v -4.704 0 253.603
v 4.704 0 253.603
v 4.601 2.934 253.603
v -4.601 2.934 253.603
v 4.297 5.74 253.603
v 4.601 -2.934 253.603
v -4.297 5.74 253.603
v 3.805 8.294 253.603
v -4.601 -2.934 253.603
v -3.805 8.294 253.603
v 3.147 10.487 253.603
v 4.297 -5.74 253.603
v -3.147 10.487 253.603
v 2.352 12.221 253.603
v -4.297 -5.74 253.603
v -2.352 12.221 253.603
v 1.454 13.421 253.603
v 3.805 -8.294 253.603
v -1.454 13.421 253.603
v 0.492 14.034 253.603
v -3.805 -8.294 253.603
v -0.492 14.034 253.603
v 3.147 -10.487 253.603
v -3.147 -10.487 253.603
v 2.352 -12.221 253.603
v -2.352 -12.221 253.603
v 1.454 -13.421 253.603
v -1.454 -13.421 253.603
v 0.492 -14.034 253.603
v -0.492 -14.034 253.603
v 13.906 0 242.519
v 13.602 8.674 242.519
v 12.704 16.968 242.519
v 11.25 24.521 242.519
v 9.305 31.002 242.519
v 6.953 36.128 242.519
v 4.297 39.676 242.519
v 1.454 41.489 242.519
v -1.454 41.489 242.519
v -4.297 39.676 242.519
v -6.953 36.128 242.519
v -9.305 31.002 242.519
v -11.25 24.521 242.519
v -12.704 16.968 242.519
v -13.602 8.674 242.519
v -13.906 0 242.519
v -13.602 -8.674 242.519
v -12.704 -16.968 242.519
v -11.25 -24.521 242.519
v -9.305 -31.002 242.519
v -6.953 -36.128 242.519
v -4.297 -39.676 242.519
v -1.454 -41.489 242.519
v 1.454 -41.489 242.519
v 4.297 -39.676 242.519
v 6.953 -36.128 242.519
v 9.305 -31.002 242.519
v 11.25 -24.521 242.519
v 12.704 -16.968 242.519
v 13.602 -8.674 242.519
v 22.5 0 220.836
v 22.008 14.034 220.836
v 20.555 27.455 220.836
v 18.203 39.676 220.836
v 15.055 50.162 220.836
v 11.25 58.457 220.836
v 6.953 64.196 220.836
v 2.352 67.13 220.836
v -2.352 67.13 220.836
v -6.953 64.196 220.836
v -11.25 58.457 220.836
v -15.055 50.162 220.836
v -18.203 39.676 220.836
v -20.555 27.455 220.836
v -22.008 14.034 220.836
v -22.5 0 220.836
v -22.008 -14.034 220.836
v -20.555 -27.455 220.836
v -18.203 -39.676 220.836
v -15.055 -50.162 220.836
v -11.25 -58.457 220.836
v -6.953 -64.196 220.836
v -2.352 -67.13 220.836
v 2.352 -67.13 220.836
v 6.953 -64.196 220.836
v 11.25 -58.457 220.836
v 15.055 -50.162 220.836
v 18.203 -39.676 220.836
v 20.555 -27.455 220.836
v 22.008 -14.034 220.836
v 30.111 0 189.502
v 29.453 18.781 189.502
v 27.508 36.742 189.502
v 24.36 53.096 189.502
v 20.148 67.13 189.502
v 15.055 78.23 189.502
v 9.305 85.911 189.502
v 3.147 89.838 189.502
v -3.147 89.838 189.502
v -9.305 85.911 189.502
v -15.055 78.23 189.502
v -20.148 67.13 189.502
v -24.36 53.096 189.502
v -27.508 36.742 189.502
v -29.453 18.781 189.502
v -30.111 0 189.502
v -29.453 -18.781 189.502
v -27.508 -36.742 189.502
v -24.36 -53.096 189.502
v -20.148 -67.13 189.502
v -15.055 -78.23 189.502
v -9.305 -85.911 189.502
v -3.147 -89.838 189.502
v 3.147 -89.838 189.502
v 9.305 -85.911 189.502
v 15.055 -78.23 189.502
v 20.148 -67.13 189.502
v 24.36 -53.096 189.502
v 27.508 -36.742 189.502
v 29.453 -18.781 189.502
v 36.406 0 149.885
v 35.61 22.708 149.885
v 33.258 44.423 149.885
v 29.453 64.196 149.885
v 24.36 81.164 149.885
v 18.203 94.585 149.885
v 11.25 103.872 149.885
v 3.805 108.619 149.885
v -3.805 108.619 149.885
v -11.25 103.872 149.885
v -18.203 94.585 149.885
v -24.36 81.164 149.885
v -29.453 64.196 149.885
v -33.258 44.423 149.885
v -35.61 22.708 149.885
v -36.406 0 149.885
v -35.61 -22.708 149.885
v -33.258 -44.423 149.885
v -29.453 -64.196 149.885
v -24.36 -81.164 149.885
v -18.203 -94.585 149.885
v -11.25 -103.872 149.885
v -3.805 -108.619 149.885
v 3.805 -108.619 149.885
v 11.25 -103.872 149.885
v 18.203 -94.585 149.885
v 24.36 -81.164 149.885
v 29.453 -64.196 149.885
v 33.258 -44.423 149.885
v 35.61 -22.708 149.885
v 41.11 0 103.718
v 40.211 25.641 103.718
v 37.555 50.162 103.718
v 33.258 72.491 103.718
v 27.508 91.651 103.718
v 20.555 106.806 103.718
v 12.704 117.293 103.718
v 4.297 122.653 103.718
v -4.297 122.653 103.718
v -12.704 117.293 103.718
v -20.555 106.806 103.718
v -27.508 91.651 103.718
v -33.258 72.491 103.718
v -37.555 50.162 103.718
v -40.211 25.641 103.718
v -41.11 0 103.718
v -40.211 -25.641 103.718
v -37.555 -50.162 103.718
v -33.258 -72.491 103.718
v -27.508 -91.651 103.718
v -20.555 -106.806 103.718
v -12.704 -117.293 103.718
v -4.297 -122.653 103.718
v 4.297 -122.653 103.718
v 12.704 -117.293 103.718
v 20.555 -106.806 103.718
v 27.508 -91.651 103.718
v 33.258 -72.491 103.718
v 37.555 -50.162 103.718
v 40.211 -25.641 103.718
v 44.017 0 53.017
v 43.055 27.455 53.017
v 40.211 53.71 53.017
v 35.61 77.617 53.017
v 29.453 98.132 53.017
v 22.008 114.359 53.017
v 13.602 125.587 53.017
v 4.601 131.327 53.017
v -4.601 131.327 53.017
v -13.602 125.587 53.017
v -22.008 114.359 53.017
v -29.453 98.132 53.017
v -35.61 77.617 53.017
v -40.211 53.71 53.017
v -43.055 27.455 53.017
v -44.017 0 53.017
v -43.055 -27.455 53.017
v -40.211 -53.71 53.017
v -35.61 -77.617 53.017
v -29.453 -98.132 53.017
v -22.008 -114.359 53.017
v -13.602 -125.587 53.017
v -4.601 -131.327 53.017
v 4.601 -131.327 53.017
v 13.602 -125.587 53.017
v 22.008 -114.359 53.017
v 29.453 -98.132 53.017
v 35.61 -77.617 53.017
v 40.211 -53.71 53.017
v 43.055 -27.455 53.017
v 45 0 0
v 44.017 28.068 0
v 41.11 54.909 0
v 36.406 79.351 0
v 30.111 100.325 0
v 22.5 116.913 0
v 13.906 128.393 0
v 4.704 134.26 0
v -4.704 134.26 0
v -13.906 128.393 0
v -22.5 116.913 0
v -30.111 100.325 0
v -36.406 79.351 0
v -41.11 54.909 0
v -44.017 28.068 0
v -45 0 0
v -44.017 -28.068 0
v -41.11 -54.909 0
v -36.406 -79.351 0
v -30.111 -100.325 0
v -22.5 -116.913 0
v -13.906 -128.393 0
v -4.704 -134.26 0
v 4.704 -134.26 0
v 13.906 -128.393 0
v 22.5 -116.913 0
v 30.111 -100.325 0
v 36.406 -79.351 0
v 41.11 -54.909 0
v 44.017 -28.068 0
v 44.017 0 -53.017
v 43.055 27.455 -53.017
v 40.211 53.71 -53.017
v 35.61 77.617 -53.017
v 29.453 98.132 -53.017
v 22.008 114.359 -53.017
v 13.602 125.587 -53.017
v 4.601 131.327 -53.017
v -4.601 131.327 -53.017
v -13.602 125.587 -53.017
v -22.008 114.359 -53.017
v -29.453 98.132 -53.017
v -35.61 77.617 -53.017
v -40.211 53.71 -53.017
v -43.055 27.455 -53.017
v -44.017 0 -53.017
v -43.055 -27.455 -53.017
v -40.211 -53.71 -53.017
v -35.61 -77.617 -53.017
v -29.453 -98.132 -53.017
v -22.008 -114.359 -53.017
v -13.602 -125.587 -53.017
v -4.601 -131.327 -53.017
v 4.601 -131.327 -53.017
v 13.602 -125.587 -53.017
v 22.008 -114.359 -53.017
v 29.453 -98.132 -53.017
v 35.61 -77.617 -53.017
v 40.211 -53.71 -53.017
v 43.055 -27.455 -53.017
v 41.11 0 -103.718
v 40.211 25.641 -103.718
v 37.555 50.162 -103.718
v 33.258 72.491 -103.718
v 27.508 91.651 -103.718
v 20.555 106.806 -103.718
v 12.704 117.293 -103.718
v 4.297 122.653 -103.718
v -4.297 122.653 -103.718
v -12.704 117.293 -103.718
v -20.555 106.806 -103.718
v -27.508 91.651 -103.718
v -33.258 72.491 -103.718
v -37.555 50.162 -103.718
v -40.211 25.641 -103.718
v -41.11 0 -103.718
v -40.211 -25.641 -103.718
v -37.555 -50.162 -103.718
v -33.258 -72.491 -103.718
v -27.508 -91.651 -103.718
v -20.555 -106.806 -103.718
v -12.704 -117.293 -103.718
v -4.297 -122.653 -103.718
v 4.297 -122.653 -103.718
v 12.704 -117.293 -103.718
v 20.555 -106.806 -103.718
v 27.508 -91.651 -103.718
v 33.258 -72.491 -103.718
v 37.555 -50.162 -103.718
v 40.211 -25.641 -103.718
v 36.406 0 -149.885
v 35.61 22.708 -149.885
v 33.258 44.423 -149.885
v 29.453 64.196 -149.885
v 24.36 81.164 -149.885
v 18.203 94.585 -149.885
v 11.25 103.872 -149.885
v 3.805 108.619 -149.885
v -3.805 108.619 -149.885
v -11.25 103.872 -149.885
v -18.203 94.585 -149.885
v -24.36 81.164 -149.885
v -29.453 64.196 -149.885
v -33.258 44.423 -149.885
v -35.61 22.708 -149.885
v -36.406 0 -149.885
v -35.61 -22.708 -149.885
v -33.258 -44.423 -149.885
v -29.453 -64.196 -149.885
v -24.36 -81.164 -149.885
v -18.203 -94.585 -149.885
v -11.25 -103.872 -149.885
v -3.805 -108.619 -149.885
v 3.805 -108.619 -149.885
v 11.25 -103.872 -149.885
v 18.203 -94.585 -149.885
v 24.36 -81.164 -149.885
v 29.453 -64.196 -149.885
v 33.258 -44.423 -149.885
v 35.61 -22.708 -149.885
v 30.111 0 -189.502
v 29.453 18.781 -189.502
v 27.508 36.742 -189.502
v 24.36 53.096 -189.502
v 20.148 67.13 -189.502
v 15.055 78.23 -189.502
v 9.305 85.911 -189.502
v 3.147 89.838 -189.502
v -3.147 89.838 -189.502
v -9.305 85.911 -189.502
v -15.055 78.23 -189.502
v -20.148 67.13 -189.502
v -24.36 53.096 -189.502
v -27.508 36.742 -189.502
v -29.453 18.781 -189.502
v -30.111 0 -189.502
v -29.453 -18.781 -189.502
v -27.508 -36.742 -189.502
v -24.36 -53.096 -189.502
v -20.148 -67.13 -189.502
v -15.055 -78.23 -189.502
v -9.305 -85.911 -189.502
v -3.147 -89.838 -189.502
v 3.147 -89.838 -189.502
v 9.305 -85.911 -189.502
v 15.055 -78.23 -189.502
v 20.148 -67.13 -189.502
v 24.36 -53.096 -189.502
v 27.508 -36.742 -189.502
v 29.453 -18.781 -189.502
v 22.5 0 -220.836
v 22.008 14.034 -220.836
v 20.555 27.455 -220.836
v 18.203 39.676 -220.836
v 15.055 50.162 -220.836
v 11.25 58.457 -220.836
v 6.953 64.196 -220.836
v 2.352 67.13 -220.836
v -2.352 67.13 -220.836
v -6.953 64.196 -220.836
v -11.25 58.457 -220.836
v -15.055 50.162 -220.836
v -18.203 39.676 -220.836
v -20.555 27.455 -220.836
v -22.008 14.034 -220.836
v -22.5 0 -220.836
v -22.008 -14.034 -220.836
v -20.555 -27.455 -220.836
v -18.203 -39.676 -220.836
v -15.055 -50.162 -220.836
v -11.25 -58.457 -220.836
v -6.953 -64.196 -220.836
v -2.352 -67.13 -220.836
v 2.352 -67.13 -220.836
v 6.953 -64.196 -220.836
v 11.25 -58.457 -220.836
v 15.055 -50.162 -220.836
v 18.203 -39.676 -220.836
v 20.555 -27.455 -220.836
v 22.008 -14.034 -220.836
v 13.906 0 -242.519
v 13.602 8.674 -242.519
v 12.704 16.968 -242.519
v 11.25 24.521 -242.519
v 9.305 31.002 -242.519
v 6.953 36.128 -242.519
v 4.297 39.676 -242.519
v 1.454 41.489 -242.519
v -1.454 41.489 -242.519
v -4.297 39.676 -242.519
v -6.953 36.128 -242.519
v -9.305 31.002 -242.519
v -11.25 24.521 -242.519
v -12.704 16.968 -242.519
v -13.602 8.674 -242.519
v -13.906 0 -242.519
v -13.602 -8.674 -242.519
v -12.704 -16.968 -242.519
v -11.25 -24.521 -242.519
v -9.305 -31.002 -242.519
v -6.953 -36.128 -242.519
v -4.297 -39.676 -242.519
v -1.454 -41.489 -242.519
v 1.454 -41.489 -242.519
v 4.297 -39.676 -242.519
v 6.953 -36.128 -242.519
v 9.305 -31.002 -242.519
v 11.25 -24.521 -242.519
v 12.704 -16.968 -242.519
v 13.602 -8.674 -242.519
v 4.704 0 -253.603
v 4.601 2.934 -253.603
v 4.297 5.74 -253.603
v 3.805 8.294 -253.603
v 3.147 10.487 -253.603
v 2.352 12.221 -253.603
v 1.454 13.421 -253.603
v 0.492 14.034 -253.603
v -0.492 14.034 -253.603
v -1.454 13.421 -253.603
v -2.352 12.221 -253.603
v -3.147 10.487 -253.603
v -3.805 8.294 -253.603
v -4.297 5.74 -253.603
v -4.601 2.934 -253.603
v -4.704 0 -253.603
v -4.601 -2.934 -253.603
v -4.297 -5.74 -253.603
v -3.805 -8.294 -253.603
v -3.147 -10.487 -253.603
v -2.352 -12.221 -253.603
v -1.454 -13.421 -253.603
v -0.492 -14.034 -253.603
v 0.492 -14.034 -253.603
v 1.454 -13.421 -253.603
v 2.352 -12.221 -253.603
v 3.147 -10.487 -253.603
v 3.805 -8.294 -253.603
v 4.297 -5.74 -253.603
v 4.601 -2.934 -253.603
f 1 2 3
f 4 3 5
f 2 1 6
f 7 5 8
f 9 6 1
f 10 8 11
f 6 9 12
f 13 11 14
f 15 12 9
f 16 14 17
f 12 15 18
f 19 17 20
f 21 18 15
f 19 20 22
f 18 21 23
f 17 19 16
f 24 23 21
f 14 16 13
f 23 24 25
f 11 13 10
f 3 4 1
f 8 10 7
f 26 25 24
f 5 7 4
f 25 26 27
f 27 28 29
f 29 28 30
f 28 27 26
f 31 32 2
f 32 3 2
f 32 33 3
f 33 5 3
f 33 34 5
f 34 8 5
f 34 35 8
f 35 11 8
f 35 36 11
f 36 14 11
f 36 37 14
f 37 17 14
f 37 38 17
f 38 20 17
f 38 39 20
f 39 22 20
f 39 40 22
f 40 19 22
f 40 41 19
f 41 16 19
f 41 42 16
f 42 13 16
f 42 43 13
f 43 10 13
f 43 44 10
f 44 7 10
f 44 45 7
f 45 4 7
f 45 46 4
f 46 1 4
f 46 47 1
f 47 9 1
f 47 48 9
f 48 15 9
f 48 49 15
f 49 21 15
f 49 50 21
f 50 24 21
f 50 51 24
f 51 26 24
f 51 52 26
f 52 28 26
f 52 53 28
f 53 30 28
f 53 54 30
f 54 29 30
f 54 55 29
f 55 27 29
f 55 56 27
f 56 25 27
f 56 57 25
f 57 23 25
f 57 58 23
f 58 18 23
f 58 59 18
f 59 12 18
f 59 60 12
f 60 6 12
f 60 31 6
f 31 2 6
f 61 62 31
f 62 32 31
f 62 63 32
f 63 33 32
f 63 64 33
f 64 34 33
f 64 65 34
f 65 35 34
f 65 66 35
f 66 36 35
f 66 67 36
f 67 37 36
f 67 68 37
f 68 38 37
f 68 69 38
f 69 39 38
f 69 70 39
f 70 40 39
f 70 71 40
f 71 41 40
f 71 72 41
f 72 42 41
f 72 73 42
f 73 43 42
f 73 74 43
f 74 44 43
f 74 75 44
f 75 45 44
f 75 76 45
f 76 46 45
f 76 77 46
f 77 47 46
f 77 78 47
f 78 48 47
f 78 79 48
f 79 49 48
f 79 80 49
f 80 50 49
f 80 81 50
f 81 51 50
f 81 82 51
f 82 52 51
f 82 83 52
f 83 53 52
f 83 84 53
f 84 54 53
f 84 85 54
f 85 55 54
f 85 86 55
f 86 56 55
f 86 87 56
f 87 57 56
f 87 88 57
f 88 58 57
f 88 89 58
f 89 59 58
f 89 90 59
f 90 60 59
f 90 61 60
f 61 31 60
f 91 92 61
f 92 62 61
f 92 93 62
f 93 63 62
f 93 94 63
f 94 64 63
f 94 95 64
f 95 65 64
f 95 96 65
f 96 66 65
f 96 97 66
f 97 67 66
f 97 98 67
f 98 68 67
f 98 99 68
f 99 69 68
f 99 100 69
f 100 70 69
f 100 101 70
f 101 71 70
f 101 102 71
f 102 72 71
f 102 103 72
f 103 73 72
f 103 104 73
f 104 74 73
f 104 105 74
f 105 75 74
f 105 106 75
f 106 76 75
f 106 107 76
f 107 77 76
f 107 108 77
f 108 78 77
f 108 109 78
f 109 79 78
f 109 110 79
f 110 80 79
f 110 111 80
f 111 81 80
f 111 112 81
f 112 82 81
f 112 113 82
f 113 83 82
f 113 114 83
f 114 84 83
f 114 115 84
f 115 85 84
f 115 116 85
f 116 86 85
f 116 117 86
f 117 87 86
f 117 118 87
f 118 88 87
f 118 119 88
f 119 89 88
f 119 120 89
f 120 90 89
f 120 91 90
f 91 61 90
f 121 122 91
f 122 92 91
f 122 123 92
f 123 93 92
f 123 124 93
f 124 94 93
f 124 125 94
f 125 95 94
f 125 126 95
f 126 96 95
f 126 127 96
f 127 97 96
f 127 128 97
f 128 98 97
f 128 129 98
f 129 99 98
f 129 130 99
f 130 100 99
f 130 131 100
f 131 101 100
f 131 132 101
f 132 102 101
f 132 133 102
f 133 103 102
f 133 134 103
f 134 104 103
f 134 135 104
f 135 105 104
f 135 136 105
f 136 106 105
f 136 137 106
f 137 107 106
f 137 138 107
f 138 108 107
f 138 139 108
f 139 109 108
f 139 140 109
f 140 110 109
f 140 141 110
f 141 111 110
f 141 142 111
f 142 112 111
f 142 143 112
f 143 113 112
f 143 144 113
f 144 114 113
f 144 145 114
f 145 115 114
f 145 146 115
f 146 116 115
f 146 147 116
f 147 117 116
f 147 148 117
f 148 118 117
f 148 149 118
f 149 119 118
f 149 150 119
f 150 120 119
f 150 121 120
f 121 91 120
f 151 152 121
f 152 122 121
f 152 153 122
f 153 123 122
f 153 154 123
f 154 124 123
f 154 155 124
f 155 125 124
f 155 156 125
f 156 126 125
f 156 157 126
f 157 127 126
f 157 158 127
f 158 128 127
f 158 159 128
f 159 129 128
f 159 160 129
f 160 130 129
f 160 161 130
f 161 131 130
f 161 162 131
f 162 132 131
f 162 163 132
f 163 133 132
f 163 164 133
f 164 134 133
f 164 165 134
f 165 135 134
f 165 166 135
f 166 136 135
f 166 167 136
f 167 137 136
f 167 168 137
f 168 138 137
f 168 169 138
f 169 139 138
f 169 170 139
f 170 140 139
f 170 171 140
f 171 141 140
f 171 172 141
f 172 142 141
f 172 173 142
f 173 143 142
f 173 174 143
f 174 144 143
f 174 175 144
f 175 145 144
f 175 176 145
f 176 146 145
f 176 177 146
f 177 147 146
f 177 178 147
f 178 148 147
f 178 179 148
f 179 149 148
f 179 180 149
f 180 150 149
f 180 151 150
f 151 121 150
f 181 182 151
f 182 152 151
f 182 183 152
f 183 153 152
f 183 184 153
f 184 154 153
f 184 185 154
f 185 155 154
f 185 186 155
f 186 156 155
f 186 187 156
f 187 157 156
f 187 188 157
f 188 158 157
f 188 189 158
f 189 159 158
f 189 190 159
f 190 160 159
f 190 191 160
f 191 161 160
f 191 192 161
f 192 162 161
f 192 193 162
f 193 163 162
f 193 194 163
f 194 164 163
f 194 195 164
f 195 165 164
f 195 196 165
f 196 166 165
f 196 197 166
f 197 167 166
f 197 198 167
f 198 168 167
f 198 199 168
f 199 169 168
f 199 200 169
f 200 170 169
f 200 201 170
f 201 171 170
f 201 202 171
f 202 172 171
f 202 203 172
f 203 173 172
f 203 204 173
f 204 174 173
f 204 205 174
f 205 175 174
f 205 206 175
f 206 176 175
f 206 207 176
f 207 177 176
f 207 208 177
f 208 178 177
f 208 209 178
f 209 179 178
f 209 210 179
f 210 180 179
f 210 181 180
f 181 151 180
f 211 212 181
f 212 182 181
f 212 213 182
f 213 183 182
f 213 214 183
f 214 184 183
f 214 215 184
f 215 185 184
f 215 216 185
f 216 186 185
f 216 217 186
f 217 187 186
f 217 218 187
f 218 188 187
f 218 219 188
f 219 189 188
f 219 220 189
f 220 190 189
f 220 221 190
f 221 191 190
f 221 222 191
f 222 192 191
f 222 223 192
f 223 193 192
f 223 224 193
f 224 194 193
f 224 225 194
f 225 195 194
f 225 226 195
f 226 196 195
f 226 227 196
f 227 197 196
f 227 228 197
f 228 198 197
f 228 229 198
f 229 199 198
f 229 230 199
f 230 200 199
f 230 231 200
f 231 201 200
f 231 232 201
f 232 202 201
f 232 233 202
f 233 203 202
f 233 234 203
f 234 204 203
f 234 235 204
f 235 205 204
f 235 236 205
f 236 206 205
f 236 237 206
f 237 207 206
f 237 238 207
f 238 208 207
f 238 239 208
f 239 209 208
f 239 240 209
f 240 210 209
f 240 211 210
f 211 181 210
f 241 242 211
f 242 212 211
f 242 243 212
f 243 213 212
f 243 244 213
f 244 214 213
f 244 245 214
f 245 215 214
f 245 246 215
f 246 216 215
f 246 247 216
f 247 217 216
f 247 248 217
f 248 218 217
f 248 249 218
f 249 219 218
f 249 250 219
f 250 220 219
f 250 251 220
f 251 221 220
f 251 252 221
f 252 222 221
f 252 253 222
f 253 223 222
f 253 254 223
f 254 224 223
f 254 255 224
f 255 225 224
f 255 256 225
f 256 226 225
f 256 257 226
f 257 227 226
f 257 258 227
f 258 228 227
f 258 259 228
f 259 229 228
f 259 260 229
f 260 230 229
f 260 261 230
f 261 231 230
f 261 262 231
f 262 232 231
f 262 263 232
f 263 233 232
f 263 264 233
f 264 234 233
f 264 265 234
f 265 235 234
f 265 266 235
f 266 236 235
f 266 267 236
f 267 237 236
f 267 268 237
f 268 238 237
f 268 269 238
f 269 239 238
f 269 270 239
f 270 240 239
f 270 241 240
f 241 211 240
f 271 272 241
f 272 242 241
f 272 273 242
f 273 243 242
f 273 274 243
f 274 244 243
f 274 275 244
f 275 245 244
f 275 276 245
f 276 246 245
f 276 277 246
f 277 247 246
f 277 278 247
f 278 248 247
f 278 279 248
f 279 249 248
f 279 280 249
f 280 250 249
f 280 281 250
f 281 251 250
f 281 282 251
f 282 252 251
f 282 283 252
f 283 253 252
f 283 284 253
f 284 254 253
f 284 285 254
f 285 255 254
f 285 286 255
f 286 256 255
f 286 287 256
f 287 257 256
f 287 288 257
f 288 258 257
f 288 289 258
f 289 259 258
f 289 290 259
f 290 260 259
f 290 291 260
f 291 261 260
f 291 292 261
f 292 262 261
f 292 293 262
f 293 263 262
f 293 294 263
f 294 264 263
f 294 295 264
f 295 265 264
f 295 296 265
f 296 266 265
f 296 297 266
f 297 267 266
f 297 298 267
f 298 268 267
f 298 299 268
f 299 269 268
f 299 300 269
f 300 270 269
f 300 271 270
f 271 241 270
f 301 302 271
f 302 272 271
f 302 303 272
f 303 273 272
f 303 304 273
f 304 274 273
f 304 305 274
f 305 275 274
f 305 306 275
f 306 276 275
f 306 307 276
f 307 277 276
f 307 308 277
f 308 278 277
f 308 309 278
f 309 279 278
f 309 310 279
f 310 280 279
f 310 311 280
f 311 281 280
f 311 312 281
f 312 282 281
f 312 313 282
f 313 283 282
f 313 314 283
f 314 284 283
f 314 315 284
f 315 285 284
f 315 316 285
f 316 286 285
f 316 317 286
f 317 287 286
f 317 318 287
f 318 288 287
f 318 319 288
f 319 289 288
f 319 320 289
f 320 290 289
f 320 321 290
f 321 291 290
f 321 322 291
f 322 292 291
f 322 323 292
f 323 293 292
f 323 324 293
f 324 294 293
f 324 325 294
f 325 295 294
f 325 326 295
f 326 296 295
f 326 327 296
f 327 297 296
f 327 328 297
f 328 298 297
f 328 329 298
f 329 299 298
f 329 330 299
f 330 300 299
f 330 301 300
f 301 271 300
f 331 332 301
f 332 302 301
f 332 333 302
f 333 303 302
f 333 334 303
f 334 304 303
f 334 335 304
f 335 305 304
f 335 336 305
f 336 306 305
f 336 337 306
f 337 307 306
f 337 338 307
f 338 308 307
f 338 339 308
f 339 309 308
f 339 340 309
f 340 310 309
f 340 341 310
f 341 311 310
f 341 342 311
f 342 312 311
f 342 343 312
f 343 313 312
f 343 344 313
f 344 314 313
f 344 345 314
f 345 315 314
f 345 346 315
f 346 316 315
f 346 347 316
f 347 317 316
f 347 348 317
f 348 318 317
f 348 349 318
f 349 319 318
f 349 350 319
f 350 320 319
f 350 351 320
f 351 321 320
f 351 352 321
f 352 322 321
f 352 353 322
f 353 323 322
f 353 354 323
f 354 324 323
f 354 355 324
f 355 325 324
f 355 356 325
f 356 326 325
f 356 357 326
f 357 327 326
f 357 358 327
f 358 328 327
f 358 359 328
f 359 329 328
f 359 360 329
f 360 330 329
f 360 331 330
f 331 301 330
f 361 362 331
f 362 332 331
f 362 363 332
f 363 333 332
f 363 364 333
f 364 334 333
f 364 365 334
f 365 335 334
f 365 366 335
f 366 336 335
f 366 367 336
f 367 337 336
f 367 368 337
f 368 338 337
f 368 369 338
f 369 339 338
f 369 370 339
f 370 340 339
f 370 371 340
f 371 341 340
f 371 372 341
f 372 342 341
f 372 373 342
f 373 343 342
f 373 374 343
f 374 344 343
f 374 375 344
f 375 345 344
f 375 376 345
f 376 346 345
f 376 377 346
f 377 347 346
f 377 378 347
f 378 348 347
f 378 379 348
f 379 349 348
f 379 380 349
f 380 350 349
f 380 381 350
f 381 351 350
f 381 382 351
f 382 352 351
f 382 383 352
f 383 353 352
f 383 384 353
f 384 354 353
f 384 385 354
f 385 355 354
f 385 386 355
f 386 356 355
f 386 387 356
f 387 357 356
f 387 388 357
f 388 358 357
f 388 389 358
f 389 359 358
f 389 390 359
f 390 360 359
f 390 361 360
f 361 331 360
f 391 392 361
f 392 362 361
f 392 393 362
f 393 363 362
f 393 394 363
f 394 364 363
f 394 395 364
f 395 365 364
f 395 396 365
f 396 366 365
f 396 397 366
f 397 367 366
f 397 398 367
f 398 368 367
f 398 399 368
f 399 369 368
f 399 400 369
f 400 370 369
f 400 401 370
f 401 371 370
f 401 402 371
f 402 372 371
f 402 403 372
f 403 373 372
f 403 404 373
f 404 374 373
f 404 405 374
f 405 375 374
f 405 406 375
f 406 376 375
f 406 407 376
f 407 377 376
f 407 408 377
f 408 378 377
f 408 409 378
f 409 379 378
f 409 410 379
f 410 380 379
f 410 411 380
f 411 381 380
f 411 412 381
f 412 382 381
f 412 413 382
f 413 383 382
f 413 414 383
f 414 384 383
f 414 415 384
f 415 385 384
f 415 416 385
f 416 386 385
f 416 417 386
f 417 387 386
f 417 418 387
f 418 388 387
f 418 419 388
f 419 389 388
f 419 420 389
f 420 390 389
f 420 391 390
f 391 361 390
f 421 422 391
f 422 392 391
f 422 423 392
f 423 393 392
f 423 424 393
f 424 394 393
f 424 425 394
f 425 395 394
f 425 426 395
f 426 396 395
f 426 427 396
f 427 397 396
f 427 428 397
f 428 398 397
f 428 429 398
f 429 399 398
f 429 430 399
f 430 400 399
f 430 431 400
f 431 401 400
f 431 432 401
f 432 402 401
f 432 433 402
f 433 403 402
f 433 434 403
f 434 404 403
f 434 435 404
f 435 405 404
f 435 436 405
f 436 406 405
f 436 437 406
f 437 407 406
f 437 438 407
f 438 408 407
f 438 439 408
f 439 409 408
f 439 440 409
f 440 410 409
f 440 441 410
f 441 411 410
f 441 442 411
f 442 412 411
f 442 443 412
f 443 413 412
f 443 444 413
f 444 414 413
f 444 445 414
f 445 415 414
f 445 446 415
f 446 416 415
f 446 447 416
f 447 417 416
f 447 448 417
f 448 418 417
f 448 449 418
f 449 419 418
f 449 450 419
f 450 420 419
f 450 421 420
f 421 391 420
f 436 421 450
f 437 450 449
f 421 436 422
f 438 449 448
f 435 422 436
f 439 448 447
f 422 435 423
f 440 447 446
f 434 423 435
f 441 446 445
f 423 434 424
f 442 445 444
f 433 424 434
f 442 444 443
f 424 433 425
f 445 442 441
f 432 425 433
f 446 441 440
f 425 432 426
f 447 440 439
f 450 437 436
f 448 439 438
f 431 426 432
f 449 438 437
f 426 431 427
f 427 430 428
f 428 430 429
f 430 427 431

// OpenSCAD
// Generated by SolidPython 1.0.1 on 2020-07-29 00:46:45


scale(v = [3, 9, 17]) {
	sphere(r = 15);
}
/***********************************************
*********      SolidPython code:      **********
************************************************
 
# import packages: SolidPython
from solid import *
from solid.utils import *
from itertools import chain, combinations, permutations


class Resize:

    def __init__(self, scad_file):
        self.scad_file = scad_file
        #self.scad_file = import_scad(scad_file)
        # cone/cylinder param:
        self.r1 = 0
        self.r2 = 0
        self.h = 0
        # rectangular prism param:
        self.w = 0
        self.l = 0
        # ellipse param:
        self.r = 0

    # import OpenScad code (file name corresponds to shape)


    # classify shape + parameters
    def assign(self, param1, param2, param3):
        if self.scad_file == 'cone.scad':
            self.r1 = param1
            self.r2 = param2
            self.h = param3
        elif self.scad_file == 'cylinder.scad':
            self.r1 = param1
            self.r2 = param2
            self.h = param3
        elif self.scad_file == 'rectangularPrism.scad':
            self.h = param1
            self.l = param2
            self.w = param3
        else:
            self.r = param1
            self.h = param2

    # resize parameters
    def iterate(self):
        x = range(3, 20, 2)
        i = 1
        if self.scad_file == 'cone.scad':
            tempList = list(permutations(x, 2))
            for temp in tempList:
                param1 = temp[0]
                param2 = temp[1]
                filepath = 'produced_scad_files/' + 'cone' + str(param1) + '_' + str(param2) + '_' + '.scad'
                scad_render_to_file(cylinder(h=param1, r1=param2, r2=0), filepath)

        elif self.scad_file == 'cylinder.scad':
            tempList = list(permutations(x, 3))
            for temp in tempList:
                param1 = temp[0]
                param2 = temp[1]
                filepath = 'produced_scad_files/' + 'cylinder' + str(param1) + '_' + str(param2) + '_' + '.scad'
                scad_render_to_file(cylinder(h=param1, r1=param2, r2=param2), filepath)

        elif self.scad_file == 'rectangularPrism.scad':
            tempList = list(permutations(x, 3))
            for temp in tempList:
                param1 = temp[0]
                param2 = temp[1]
                param3 = temp[2]
                filepath = 'produced_scad_files/' + 'rectangularPrism' + str(param1) + '_' + str(param2) + '_' + str(
                    param3) + '.scad'
                scad_render_to_file(cube(size=(param1, param2, param3)), filepath)

        elif self.scad_file == 'ellipse.scad':
            tempList = list(permutations(x, 4))
            for temp in tempList:
                param1 = temp[0]
                param2 = temp[1]
                param3 = temp[2]
                param4 = temp[3]
                filepath = 'produced_scad_files/' + 'ellipse' + str(param1) + '_' + str(param2) + '_' + str(param3) + '_' + str(param4) + '.scad'
                scad_render_to_file(scale([param1, param2, param3])(sphere(r=param4)), filepath)

    def render_to_scadfile(self):
        scad_render_to_file(scad, 'example.scad') 
 
************************************************/
